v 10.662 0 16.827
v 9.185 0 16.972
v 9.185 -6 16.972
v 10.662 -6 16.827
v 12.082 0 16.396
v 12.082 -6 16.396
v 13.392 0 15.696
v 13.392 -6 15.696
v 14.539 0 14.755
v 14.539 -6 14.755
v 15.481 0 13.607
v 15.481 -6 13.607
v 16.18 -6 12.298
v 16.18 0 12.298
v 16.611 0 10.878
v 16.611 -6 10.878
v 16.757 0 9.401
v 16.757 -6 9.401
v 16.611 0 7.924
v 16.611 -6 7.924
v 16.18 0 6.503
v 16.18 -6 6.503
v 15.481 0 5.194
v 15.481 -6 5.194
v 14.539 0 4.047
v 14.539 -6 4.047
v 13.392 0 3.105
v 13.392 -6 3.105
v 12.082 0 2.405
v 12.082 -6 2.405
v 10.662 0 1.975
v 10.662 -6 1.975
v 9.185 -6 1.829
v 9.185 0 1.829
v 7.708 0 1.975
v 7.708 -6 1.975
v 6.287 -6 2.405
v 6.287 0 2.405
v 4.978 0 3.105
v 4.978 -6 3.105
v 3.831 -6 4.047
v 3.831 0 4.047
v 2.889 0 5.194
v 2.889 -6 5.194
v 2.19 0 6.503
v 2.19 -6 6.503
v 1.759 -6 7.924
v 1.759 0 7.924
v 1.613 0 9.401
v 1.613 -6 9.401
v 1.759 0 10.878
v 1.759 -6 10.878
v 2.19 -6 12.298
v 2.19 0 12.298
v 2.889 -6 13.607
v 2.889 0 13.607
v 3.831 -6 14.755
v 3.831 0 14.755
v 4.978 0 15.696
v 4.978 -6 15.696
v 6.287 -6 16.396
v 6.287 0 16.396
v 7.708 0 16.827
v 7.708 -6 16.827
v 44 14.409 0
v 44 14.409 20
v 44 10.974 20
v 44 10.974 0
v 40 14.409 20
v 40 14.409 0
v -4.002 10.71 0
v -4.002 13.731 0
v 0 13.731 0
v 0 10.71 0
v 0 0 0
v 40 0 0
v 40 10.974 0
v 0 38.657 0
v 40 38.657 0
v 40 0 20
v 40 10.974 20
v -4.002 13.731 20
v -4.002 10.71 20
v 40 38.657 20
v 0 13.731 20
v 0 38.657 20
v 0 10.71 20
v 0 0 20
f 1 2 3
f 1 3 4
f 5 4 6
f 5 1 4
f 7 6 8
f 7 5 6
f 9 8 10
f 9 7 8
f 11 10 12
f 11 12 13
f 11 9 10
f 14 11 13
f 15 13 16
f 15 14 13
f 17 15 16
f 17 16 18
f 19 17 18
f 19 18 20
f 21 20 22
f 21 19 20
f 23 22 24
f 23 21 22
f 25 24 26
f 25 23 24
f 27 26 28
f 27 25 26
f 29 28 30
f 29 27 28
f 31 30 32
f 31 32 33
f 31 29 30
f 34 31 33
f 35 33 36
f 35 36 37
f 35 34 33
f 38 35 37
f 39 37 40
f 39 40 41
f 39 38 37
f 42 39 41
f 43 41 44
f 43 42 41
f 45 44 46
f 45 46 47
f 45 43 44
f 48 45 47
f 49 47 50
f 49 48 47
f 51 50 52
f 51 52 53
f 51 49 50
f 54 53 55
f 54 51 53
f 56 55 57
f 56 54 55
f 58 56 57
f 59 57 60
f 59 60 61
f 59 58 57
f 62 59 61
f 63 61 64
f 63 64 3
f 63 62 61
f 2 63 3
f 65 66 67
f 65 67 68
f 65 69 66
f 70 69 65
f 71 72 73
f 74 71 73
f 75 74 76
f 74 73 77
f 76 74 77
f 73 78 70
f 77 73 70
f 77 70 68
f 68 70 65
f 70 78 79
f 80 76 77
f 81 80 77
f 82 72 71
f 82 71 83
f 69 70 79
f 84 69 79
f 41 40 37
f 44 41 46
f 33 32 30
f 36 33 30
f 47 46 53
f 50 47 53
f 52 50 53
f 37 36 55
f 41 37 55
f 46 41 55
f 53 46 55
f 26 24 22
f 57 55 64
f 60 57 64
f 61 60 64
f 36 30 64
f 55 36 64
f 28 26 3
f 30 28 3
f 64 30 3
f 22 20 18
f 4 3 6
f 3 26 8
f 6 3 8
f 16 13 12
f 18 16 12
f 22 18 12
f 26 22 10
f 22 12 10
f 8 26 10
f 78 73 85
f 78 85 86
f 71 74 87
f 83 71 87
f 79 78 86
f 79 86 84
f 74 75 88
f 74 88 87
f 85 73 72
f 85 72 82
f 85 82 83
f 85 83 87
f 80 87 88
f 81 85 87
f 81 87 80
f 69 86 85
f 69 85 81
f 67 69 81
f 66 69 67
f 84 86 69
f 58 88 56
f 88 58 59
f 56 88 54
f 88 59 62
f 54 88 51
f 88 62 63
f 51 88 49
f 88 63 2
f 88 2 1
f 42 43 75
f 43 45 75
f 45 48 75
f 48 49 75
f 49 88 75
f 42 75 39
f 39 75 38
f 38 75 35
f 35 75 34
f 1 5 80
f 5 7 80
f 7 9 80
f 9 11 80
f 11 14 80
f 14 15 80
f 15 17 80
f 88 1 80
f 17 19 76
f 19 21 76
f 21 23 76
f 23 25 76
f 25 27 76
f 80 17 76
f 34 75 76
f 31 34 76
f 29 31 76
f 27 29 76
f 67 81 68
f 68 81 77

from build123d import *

# Parameters (mm, degrees)
SKETCH_3_W      = 40
SKETCH_3_H      = 38.656537643
EXTRUDE_1_DEPTH = 20
SKETCH_4_R      = 7.571632933
EXTRUDE_2_DEPTH = 6
SKETCH_5_W      = 20
SKETCH_5_H      = 3.020345361
EXTRUDE_3_DEPTH = 4.002234026
SKETCH_6_W      = 20
SKETCH_6_H      = 3.435678125
EXTRUDE_4_DEPTH = 4


with BuildPart() as part:
    # 草图3 → 凸台-拉伸1 (new body)
    with BuildSketch(Plane.XY):
        with Locations((20, 19.328268822)):
            Rectangle(SKETCH_3_W, SKETCH_3_H)
    extrude(amount=EXTRUDE_1_DEPTH)

    # 草图4 → 凸台-拉伸2 (add)
    with BuildSketch(Plane(origin=(0, 0, 0), x_dir=(1, 0, 0), z_dir=(0, 1, 0))):
        with Locations(Location((9.184956981, -9.400712822, 0), (0, 0, 270))):
            Circle(SKETCH_4_R)
    extrude(amount=-EXTRUDE_2_DEPTH)

    # 草图5 → 凸台-拉伸3 (add)
    with BuildSketch(Plane.ZY):
        with Locations((10, 12.220599132)):
            Rectangle(SKETCH_5_W, SKETCH_5_H)
    extrude(amount=EXTRUDE_3_DEPTH)

    # 草图6 → 凸台-拉伸4 (add)
    with BuildSketch(Plane(origin=(40, 0, 0), x_dir=(0, 0, -1), z_dir=(1, 0, 0))):
        with Locations((-10, 12.69140217)):
            Rectangle(SKETCH_6_W, SKETCH_6_H)
    extrude(amount=EXTRUDE_4_DEPTH)


solid = part.part
